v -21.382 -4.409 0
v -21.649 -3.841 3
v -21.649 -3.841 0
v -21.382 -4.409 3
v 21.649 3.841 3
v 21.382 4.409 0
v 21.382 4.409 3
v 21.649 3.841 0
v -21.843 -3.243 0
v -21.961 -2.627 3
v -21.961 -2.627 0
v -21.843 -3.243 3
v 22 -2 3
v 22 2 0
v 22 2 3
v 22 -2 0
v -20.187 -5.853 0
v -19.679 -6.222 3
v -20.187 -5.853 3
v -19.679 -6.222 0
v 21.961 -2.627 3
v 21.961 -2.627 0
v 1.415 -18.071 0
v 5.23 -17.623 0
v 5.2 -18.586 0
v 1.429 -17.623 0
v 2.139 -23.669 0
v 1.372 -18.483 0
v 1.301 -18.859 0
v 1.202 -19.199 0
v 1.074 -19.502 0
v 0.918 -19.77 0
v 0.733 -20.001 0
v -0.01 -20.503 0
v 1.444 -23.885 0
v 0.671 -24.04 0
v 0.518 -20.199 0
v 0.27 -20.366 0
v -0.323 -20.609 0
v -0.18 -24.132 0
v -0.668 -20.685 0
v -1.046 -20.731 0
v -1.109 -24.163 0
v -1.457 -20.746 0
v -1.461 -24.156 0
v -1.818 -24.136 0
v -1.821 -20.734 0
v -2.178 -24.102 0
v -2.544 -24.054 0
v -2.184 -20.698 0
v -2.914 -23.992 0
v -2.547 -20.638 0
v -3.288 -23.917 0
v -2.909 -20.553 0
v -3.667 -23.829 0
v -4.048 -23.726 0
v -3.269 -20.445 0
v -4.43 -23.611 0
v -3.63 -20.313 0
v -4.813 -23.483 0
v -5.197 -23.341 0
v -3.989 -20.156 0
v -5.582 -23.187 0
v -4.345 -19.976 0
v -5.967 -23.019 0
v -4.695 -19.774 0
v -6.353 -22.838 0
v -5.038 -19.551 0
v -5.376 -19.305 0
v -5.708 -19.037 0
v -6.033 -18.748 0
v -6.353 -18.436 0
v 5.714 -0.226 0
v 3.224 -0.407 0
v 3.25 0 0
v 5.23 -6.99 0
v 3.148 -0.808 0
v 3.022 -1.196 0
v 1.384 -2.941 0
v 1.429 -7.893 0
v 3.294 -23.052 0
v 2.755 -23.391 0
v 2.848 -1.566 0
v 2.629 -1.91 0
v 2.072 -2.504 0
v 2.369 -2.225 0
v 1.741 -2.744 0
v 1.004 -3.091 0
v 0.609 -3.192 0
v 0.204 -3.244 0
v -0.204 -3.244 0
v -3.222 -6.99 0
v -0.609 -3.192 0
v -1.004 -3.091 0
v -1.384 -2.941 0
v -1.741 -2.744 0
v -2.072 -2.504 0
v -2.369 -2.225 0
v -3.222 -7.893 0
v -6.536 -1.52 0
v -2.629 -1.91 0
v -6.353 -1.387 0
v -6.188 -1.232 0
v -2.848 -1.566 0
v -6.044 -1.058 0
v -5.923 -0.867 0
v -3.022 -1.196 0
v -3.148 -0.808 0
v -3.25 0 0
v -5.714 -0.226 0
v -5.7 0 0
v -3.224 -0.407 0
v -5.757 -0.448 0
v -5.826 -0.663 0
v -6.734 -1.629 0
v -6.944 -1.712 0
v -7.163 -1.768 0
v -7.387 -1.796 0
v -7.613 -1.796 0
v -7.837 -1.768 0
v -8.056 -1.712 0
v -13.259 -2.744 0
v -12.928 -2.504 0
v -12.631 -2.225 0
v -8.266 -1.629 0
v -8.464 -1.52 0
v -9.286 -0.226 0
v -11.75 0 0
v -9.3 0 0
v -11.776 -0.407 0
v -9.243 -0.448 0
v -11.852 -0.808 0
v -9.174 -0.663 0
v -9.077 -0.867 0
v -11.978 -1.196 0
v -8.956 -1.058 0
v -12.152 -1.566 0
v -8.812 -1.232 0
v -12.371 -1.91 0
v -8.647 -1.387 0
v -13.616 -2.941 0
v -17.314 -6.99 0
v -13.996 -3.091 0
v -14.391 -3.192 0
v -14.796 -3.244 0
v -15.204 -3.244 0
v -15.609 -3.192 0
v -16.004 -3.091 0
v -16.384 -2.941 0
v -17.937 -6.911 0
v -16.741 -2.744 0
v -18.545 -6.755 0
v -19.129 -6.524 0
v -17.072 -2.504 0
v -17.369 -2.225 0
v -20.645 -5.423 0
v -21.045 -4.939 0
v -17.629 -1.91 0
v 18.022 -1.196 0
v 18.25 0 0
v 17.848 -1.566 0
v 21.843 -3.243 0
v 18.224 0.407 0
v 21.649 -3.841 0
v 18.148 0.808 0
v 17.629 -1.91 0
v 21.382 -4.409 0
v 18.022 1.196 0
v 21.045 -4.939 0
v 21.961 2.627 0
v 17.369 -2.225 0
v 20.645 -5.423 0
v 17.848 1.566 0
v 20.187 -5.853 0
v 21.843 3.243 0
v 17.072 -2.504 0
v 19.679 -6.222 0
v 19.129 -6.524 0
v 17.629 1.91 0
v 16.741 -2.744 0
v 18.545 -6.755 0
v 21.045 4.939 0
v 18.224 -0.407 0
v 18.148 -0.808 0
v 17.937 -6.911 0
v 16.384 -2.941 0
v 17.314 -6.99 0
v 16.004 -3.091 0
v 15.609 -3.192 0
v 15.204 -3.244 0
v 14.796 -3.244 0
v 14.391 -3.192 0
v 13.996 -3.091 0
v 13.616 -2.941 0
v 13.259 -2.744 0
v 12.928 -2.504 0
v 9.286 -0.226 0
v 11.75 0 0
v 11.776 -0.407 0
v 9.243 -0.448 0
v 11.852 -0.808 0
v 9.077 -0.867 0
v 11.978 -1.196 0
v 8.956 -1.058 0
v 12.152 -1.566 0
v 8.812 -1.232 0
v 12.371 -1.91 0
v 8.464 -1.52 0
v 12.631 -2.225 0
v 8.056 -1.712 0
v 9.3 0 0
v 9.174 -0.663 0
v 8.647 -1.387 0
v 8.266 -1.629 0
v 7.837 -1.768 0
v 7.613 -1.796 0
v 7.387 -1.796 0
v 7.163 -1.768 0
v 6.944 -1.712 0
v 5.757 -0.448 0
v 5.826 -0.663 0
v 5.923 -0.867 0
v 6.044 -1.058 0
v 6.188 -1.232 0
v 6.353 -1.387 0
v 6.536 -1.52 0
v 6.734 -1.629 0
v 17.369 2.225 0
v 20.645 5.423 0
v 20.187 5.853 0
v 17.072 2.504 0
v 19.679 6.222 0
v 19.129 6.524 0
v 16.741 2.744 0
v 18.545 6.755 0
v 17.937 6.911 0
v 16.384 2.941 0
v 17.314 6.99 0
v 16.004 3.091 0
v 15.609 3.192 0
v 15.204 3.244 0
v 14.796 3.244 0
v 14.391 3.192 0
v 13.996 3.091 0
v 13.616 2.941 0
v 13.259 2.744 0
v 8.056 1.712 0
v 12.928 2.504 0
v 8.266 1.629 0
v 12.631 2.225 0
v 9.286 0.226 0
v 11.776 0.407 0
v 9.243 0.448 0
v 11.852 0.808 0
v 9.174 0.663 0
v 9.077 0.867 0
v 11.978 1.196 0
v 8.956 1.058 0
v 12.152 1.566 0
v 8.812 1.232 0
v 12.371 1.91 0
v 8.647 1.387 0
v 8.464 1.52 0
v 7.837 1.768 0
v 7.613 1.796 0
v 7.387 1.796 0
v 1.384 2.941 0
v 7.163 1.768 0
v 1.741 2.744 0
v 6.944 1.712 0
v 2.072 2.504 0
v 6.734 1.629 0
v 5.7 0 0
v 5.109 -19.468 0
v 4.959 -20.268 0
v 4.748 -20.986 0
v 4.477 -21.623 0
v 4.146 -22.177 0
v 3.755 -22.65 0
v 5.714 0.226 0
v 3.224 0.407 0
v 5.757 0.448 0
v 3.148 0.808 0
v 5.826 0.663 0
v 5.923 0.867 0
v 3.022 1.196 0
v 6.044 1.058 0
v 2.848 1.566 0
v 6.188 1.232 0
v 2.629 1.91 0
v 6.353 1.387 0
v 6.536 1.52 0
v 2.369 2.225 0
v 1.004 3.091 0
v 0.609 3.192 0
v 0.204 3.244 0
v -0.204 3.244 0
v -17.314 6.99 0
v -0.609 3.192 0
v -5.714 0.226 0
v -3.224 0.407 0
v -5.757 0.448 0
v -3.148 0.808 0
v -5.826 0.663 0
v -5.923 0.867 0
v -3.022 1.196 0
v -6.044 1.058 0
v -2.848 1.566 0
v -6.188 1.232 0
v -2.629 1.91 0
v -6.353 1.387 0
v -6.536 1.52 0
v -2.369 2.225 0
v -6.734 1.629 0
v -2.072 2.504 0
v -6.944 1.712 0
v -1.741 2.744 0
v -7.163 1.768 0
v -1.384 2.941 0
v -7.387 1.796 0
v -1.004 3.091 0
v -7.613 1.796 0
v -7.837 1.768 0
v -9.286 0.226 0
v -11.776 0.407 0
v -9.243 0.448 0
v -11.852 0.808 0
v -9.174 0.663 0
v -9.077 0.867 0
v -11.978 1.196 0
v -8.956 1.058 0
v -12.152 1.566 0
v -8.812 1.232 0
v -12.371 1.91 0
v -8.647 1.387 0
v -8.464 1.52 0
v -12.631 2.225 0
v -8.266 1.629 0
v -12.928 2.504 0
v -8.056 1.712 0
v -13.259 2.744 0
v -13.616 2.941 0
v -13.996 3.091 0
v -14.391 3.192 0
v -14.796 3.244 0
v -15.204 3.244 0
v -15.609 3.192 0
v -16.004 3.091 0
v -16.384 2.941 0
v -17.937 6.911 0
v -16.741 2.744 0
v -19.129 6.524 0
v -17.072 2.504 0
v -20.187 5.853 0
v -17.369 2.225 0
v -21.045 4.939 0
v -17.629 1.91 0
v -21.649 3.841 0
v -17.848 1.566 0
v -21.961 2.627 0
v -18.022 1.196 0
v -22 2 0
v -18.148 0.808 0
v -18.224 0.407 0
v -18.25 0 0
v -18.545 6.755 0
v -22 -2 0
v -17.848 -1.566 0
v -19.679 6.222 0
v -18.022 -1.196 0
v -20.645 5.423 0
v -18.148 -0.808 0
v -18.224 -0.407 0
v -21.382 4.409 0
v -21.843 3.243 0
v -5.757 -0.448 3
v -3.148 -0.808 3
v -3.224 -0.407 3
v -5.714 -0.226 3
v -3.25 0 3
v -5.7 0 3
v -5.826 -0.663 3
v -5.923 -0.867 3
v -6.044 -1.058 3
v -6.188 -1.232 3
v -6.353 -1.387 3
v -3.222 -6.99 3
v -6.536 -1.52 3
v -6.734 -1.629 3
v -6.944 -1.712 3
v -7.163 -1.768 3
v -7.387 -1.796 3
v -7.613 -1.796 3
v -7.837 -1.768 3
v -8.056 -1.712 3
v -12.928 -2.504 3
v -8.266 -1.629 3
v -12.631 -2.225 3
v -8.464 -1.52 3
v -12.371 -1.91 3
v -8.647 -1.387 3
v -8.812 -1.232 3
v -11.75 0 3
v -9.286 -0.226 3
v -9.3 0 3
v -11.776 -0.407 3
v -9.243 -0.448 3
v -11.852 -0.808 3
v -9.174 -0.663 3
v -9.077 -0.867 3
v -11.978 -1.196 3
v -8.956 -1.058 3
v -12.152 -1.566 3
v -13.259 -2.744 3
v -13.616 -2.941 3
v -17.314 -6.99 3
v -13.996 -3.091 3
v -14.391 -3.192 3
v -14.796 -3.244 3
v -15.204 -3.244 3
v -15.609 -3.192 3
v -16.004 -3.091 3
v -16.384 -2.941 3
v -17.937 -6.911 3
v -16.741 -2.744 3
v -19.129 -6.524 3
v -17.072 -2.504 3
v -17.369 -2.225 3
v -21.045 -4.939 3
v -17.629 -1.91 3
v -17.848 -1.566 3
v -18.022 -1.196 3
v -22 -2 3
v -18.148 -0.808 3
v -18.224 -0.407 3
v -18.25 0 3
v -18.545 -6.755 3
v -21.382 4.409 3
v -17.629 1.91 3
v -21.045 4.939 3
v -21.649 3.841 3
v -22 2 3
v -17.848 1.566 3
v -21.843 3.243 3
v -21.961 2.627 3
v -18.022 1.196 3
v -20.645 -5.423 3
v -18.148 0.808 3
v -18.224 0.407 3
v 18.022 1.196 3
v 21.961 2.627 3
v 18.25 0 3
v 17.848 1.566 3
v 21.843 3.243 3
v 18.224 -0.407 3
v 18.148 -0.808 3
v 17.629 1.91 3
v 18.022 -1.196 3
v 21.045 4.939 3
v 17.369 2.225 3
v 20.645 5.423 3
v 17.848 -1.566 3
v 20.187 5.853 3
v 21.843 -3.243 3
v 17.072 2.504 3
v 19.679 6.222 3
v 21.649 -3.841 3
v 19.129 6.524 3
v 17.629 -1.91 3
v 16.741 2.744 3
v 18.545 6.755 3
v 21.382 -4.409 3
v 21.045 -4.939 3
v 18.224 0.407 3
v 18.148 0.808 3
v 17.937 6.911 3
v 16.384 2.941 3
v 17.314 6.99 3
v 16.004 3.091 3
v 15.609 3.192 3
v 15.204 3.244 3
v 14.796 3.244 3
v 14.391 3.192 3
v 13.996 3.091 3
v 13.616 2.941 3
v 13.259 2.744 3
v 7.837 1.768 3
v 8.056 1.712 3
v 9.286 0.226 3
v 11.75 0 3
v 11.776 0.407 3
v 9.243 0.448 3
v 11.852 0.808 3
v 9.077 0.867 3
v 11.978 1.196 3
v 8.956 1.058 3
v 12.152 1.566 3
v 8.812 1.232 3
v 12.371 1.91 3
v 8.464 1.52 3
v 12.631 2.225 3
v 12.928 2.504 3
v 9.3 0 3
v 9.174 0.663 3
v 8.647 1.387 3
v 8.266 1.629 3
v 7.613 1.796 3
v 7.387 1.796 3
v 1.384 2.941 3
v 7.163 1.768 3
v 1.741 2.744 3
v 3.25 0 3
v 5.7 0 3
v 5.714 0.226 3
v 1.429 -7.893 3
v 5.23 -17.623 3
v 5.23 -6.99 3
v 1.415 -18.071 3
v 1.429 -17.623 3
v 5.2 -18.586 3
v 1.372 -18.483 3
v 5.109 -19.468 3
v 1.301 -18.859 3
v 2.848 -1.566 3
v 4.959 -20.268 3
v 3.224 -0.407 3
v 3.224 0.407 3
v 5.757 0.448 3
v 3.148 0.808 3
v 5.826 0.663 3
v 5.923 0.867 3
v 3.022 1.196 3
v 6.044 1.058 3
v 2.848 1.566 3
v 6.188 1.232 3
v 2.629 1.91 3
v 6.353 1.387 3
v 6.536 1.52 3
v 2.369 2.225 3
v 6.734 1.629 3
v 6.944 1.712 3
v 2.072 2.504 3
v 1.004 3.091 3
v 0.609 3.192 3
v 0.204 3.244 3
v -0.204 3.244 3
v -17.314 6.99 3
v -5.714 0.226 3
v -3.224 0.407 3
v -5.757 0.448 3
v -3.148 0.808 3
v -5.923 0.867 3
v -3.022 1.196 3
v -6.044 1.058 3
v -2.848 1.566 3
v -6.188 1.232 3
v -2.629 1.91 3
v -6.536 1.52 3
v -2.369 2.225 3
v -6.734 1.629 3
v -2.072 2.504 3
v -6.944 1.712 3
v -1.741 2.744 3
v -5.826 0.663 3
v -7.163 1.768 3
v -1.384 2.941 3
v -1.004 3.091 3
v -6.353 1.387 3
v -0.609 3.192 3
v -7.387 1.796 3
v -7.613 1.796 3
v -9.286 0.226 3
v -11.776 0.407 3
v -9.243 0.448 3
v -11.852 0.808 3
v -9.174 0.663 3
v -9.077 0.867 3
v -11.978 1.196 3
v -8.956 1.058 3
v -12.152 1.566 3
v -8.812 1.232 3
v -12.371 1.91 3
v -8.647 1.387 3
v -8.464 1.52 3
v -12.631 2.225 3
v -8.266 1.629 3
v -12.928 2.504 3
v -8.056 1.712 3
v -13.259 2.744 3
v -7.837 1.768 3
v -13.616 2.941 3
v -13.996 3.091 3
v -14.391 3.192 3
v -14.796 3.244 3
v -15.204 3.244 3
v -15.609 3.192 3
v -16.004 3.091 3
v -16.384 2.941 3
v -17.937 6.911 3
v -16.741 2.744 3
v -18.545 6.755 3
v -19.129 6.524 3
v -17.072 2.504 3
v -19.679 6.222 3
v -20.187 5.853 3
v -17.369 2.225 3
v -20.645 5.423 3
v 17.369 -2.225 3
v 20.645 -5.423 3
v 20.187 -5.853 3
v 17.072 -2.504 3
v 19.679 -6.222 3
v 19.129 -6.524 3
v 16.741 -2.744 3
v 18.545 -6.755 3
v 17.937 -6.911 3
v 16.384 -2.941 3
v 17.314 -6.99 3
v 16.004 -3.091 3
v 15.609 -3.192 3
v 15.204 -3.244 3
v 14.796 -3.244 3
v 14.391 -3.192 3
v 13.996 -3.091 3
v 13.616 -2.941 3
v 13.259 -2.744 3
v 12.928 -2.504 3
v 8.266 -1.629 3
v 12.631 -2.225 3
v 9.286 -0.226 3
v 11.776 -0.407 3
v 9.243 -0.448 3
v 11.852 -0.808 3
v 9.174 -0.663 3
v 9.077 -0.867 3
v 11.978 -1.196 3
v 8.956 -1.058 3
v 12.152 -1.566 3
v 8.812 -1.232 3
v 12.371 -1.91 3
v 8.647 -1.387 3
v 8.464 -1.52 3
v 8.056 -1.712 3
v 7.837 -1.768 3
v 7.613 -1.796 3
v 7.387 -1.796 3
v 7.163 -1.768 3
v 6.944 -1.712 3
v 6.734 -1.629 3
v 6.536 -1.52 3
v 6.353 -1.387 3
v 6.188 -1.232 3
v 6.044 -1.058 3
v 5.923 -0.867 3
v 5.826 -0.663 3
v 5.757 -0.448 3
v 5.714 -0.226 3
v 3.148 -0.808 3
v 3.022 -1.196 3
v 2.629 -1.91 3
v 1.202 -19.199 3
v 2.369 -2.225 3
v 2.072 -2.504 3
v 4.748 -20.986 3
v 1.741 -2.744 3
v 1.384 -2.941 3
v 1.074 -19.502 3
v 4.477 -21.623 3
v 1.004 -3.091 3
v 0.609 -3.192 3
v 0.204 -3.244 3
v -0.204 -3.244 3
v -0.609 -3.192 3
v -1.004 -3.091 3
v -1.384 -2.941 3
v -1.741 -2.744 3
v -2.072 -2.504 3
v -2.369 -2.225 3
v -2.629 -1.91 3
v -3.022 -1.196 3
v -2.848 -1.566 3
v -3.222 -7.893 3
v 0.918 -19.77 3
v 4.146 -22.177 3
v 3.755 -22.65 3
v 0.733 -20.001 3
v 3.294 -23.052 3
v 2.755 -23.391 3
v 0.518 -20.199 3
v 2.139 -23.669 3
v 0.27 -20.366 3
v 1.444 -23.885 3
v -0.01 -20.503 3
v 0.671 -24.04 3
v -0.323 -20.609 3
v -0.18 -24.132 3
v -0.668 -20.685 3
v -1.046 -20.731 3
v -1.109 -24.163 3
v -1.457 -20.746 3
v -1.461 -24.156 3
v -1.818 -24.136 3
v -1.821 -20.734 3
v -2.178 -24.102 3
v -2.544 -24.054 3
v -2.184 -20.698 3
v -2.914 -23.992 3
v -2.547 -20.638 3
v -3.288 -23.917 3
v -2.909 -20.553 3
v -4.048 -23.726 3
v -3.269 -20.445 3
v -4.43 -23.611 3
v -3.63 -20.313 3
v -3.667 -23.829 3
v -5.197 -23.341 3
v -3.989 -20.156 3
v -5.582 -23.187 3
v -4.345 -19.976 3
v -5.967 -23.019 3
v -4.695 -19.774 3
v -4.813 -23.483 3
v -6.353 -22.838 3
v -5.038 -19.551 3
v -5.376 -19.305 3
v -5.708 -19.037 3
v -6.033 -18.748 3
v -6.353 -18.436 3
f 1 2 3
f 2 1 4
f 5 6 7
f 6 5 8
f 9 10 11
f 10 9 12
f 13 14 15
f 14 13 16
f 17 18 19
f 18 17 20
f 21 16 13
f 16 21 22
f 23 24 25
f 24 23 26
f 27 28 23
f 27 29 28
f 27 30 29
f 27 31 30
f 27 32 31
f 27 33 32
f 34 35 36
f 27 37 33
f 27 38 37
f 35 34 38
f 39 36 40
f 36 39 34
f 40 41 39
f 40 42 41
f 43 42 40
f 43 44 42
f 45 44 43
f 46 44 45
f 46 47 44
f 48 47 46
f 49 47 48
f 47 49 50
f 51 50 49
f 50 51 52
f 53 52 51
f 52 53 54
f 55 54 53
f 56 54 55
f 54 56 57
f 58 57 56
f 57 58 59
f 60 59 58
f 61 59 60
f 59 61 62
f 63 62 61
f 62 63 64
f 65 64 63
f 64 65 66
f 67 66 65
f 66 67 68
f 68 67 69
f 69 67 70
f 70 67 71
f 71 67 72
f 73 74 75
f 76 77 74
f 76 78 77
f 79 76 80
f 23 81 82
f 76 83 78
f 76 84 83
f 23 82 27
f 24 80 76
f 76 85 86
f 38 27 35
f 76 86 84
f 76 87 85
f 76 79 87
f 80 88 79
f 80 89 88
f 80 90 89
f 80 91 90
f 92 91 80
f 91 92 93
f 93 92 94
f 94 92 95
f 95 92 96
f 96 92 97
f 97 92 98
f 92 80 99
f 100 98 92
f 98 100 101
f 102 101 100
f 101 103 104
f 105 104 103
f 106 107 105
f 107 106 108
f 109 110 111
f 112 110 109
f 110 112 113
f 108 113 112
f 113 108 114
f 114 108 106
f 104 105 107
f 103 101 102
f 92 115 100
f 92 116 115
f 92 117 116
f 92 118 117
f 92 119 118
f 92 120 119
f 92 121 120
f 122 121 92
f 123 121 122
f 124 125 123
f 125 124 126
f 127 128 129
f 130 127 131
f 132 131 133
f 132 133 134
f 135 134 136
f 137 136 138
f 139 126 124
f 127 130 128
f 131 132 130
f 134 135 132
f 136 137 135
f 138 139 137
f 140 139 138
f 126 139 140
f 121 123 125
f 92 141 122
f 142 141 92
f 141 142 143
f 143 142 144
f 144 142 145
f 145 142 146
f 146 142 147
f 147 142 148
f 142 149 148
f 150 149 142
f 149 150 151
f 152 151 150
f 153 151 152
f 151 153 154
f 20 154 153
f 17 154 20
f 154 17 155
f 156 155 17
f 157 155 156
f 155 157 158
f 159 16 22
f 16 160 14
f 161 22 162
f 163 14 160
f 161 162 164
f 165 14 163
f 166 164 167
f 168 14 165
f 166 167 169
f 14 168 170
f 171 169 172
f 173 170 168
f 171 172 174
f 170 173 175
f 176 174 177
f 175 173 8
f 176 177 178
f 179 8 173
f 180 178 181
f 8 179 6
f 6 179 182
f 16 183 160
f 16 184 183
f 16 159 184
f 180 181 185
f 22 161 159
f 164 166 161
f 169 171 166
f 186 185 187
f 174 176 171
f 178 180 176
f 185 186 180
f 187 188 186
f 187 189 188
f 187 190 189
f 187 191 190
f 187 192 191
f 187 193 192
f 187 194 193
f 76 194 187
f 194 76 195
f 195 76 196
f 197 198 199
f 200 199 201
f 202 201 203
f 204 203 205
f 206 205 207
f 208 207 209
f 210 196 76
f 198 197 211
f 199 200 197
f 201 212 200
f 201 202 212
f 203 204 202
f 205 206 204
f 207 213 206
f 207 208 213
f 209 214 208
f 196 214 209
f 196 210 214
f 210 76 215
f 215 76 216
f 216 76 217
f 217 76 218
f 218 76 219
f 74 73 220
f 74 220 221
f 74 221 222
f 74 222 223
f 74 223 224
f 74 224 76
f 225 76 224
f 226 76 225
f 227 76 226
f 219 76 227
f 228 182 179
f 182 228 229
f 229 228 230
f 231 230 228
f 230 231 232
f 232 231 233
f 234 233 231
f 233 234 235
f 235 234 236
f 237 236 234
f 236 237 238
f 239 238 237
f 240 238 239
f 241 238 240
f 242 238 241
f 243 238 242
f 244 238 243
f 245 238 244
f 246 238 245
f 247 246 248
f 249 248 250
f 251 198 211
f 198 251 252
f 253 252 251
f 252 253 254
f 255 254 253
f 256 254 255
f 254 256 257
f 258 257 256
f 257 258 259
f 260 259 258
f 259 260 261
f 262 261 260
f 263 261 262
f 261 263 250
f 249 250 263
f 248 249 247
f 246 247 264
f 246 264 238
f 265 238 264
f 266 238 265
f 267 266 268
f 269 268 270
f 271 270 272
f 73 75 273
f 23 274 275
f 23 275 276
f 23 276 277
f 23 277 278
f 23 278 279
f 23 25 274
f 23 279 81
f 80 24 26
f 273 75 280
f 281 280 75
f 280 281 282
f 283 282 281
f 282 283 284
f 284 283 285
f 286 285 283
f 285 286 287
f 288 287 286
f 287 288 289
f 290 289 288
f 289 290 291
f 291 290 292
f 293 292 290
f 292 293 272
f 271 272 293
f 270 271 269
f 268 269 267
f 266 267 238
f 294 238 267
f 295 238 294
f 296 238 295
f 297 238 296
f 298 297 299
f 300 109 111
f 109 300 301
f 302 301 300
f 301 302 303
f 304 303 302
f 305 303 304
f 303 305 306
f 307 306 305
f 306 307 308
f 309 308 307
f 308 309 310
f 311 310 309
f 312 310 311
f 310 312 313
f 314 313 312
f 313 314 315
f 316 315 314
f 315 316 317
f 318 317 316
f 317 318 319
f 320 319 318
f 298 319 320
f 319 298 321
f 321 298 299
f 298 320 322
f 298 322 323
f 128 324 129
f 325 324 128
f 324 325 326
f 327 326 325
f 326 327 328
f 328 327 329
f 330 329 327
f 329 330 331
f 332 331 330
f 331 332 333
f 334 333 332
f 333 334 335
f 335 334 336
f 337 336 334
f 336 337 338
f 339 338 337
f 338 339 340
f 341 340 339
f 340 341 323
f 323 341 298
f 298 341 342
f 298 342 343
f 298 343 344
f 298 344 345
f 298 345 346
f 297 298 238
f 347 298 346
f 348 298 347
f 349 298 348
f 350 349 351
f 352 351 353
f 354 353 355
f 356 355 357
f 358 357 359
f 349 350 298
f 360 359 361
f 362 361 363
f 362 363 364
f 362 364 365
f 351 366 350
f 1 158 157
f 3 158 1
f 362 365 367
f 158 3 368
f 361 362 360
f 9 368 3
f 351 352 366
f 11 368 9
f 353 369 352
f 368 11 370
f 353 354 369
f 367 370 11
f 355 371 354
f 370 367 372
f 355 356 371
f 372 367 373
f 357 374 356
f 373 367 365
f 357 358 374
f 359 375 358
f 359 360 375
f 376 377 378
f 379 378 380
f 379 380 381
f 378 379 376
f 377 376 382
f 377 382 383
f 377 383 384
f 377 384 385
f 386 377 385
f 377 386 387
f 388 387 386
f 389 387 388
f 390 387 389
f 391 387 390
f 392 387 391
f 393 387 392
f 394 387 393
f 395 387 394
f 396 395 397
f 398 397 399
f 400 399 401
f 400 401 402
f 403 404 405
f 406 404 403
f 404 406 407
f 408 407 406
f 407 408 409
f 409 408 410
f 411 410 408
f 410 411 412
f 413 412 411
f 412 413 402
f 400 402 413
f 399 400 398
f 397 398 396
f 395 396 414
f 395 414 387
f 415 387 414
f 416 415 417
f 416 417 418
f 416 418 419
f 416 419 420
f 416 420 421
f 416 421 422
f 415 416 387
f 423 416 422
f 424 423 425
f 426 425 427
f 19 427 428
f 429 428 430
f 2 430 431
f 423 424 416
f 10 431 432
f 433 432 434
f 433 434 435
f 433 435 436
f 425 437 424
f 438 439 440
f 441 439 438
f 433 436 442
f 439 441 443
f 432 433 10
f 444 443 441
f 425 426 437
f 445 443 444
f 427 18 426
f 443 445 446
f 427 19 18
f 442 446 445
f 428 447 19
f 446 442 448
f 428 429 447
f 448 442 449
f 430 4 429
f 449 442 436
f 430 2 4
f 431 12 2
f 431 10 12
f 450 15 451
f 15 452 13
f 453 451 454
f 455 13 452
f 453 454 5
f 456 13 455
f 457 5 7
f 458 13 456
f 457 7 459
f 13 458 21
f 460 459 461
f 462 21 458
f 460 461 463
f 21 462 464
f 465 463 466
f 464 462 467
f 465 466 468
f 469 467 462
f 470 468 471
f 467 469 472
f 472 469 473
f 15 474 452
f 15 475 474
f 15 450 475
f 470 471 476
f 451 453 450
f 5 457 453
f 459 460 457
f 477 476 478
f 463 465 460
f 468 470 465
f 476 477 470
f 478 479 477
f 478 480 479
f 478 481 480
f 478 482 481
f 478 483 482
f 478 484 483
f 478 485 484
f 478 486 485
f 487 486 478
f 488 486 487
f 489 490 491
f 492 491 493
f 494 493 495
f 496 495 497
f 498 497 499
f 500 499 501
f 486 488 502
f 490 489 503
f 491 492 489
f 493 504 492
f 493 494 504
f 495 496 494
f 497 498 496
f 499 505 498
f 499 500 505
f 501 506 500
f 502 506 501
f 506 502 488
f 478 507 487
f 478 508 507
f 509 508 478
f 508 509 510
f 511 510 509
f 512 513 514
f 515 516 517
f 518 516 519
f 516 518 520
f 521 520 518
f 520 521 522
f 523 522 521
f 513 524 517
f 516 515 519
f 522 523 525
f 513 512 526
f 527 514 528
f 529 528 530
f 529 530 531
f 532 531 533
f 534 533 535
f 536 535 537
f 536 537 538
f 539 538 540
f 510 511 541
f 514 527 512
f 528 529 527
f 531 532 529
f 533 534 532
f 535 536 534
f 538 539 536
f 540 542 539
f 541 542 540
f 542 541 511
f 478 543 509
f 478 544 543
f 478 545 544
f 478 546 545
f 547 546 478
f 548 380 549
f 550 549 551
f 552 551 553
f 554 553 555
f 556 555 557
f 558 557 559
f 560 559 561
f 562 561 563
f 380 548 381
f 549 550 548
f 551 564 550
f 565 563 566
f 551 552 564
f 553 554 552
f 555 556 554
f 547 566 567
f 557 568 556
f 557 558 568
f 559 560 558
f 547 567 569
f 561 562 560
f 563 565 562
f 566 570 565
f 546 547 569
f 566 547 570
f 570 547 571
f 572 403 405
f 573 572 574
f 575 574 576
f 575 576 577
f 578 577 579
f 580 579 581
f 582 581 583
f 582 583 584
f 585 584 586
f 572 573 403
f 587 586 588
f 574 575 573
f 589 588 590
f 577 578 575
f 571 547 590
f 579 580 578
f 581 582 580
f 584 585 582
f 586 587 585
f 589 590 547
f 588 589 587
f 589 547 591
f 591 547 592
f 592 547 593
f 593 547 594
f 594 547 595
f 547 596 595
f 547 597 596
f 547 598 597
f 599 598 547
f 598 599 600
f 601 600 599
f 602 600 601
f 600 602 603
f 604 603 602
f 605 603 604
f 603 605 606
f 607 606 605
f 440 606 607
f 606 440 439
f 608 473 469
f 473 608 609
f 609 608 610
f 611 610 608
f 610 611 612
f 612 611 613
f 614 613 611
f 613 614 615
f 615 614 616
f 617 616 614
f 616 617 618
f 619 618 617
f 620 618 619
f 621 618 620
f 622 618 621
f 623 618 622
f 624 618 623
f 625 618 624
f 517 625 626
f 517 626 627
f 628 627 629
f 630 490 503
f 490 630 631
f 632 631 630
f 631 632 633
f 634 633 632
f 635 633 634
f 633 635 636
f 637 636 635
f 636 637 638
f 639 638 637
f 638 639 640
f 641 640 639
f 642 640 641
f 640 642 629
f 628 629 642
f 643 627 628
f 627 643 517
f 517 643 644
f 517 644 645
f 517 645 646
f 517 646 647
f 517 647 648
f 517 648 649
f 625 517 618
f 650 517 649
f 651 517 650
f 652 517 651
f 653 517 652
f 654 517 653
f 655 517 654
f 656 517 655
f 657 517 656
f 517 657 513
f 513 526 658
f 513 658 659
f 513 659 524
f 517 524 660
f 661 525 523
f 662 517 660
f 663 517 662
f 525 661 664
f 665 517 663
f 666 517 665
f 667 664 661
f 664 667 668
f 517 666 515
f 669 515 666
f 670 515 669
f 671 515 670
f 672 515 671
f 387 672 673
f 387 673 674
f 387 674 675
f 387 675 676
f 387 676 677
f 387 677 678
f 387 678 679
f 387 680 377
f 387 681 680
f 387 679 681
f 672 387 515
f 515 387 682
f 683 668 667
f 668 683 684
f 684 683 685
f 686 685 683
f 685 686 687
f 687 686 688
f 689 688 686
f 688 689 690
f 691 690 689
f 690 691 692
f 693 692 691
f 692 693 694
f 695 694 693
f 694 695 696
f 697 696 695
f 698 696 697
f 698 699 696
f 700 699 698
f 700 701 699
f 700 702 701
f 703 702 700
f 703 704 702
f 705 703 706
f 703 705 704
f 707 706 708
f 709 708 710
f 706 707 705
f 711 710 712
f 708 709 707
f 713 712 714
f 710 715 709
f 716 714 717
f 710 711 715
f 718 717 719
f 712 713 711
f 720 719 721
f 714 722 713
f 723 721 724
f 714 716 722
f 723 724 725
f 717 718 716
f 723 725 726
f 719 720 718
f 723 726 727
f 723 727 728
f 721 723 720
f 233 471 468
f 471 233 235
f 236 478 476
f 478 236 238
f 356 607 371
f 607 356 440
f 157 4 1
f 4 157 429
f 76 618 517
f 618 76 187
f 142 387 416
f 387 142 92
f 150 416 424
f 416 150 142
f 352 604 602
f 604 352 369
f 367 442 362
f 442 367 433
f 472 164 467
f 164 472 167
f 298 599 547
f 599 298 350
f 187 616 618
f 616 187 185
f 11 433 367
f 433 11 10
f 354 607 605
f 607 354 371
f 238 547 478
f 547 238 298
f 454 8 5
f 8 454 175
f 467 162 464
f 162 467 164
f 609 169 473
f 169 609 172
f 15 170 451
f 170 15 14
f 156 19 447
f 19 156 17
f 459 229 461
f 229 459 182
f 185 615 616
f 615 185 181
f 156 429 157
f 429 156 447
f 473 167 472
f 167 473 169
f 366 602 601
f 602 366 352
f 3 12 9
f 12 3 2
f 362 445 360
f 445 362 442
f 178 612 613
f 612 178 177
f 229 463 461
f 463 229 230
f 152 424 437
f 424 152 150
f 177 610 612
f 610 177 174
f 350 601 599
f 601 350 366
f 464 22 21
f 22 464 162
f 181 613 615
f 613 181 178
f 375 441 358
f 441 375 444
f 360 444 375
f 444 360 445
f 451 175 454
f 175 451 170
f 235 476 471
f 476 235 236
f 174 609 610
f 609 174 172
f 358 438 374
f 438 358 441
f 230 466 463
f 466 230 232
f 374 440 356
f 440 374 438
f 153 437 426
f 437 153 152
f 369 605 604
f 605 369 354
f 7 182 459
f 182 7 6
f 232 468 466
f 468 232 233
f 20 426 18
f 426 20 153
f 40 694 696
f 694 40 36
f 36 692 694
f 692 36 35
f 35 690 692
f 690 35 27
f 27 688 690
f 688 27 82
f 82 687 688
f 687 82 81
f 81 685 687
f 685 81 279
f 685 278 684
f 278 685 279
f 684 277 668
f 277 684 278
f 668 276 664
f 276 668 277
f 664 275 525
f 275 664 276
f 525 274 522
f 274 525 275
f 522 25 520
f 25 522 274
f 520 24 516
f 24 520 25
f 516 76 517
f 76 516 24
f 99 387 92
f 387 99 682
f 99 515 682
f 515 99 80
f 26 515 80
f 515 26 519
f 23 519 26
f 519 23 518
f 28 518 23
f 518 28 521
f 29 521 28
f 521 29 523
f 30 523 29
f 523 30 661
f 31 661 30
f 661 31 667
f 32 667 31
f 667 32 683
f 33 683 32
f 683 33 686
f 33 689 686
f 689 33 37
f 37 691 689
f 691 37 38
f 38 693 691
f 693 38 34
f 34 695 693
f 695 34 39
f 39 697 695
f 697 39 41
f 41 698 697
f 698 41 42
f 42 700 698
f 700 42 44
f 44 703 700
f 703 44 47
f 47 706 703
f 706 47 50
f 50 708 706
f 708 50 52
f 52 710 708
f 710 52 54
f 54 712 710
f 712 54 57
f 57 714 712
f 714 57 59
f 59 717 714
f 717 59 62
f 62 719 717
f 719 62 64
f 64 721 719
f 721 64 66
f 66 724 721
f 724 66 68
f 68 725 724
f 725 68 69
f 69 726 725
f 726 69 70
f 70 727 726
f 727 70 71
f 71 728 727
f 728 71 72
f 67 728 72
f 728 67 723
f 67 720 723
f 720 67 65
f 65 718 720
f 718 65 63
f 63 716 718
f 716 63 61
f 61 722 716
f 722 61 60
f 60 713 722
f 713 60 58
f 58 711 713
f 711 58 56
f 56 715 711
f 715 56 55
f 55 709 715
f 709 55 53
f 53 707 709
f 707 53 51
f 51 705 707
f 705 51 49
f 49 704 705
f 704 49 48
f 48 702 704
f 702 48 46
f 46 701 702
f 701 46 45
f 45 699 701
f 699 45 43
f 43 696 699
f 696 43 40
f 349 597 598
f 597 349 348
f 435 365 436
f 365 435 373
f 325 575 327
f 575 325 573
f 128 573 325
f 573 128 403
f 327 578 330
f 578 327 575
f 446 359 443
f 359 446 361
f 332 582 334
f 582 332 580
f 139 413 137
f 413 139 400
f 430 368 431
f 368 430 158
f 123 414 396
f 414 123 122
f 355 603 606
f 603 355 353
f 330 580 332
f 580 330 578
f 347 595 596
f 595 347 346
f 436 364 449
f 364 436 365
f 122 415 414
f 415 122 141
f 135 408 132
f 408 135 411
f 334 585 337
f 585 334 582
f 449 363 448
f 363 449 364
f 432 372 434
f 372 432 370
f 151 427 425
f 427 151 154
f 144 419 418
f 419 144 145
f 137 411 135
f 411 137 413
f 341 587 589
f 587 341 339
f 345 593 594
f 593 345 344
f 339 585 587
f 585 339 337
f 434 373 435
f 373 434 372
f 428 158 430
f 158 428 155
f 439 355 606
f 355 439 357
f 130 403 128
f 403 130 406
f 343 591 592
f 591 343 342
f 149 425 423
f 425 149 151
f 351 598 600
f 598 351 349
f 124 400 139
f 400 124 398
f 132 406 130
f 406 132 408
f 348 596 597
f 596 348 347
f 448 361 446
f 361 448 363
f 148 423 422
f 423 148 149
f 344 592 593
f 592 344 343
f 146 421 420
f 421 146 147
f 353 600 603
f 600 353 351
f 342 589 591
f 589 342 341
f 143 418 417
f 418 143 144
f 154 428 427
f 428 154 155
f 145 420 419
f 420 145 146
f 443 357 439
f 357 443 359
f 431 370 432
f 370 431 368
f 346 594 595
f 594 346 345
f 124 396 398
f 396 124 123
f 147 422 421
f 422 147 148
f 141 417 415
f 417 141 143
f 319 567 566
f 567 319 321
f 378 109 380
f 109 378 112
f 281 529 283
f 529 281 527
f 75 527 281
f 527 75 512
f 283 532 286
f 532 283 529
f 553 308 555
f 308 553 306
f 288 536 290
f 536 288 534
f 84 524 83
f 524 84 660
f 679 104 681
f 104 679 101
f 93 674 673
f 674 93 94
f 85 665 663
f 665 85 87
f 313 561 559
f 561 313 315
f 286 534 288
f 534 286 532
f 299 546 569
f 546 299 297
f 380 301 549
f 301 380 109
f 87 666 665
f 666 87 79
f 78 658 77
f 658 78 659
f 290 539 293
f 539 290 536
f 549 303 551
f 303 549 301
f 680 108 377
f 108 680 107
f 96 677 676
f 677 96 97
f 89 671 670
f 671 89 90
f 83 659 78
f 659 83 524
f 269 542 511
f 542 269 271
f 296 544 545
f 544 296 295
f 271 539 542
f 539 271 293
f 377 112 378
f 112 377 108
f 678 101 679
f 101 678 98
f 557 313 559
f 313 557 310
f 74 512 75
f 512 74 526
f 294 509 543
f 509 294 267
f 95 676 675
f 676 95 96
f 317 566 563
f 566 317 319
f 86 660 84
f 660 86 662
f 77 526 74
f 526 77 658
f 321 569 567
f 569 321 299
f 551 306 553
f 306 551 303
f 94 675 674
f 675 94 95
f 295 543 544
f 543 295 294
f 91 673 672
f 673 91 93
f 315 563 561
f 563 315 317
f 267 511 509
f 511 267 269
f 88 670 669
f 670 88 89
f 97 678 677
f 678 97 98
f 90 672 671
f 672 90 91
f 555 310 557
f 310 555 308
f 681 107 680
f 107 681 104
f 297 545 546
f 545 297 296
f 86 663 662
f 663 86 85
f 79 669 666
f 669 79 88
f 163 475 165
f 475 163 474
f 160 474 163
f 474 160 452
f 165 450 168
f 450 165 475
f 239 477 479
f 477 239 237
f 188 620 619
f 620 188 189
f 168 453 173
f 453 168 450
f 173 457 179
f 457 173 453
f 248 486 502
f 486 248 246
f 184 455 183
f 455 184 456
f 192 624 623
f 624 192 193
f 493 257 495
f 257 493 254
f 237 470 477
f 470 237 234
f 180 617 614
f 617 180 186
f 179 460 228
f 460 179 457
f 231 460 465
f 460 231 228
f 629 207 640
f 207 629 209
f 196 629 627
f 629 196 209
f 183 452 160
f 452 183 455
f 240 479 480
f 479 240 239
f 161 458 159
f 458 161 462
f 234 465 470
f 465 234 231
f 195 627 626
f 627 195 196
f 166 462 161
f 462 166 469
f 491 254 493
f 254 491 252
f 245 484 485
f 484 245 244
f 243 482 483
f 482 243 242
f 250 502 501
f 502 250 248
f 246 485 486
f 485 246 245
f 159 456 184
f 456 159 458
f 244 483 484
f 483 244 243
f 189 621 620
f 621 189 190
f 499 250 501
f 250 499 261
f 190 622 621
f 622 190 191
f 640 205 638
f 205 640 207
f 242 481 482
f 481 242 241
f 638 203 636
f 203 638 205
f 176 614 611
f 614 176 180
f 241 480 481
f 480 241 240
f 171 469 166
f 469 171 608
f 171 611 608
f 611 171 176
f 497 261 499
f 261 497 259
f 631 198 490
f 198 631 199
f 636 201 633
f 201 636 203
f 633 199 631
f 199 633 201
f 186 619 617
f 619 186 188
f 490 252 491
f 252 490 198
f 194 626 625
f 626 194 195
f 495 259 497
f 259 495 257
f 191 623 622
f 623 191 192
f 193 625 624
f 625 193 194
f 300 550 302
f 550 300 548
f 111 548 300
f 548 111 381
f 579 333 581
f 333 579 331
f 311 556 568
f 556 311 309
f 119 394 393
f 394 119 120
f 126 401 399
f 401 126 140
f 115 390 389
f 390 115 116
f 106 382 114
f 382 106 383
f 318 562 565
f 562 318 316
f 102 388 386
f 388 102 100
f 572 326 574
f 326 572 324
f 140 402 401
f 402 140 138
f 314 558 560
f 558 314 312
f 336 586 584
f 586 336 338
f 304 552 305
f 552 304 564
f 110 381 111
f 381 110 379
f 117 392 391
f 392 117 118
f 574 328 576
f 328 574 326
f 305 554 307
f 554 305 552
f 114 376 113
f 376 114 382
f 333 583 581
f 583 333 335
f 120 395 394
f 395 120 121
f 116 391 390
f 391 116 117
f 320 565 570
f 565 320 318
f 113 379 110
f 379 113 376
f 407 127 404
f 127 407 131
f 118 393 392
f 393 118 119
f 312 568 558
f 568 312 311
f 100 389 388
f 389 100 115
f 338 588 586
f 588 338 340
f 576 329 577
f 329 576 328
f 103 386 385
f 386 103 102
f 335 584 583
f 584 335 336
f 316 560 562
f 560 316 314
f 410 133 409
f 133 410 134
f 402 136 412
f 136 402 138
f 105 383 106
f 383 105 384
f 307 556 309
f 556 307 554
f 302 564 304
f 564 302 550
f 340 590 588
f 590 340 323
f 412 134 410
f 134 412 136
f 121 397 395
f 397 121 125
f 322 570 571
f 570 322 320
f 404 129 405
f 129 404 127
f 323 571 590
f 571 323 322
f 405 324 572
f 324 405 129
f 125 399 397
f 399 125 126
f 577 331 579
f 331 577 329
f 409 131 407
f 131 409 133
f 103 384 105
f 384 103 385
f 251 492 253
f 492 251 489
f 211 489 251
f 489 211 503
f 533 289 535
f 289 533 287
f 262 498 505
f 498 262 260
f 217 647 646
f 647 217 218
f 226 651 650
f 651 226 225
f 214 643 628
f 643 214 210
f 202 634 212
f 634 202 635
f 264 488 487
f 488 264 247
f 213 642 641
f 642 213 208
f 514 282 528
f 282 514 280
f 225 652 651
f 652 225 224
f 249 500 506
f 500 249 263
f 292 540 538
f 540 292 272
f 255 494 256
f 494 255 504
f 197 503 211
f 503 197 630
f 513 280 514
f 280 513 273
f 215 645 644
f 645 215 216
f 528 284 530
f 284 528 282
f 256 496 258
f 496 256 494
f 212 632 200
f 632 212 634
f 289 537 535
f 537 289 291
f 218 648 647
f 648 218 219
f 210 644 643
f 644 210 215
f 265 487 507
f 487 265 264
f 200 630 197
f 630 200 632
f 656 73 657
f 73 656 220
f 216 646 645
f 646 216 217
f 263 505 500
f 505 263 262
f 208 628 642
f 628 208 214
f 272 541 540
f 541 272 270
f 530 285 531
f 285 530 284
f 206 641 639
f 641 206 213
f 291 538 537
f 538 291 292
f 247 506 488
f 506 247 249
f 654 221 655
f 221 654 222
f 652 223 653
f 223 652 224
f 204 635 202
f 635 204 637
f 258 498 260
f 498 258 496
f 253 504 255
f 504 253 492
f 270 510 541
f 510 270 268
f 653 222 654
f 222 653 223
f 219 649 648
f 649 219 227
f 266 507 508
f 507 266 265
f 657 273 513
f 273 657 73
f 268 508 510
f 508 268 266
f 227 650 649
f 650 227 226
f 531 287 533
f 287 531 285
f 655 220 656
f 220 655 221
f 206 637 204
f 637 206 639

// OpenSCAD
$fn = 50;


difference() {
	union() {
		hull() {
			translate(v = [-17.0000000000, 2.0000000000, 0]) {
				cylinder(h = 3, r = 5);
			}
			translate(v = [17.0000000000, 2.0000000000, 0]) {
				cylinder(h = 3, r = 5);
			}
			translate(v = [-17.0000000000, -2.0000000000, 0]) {
				cylinder(h = 3, r = 5);
			}
			translate(v = [17.0000000000, -2.0000000000, 0]) {
				cylinder(h = 3, r = 5);
			}
		}
		translate(v = [0, -5, 0]) {
			linear_extrude(height = 3) {
				text(font = "DejaVu Sans Mono:style=Bold", halign = "center", size = 19.0000000000, text = "J", valign = "top");
			}
		}
	}
	union() {
		translate(v = [-15.0000000000, 0.0000000000, 0]) {
			translate(v = [0, 0, -100]) {
				cylinder(h = 200, r = 3.2500000000);
			}
		}
		translate(v = [0, 0, -100]) {
			cylinder(h = 200, r = 3.2500000000);
		}
		translate(v = [15.0000000000, 0.0000000000, 0]) {
			translate(v = [0, 0, -100]) {
				cylinder(h = 200, r = 3.2500000000);
			}
		}
		translate(v = [-15.0000000000, 0.0000000000, 0]) {
			translate(v = [0, 0, -100]) {
				cylinder(h = 200, r = 1.8000000000);
			}
		}
		translate(v = [-7.5000000000, 0.0000000000, 0]) {
			translate(v = [0, 0, -100]) {
				cylinder(h = 200, r = 1.8000000000);
			}
		}
		translate(v = [0, 0, -100]) {
			cylinder(h = 200, r = 1.8000000000);
		}
		translate(v = [7.5000000000, 0.0000000000, 0]) {
			translate(v = [0, 0, -100]) {
				cylinder(h = 200, r = 1.8000000000);
			}
		}
		translate(v = [15.0000000000, 0.0000000000, 0]) {
			translate(v = [0, 0, -100]) {
				cylinder(h = 200, r = 1.8000000000);
			}
		}
	}
}
